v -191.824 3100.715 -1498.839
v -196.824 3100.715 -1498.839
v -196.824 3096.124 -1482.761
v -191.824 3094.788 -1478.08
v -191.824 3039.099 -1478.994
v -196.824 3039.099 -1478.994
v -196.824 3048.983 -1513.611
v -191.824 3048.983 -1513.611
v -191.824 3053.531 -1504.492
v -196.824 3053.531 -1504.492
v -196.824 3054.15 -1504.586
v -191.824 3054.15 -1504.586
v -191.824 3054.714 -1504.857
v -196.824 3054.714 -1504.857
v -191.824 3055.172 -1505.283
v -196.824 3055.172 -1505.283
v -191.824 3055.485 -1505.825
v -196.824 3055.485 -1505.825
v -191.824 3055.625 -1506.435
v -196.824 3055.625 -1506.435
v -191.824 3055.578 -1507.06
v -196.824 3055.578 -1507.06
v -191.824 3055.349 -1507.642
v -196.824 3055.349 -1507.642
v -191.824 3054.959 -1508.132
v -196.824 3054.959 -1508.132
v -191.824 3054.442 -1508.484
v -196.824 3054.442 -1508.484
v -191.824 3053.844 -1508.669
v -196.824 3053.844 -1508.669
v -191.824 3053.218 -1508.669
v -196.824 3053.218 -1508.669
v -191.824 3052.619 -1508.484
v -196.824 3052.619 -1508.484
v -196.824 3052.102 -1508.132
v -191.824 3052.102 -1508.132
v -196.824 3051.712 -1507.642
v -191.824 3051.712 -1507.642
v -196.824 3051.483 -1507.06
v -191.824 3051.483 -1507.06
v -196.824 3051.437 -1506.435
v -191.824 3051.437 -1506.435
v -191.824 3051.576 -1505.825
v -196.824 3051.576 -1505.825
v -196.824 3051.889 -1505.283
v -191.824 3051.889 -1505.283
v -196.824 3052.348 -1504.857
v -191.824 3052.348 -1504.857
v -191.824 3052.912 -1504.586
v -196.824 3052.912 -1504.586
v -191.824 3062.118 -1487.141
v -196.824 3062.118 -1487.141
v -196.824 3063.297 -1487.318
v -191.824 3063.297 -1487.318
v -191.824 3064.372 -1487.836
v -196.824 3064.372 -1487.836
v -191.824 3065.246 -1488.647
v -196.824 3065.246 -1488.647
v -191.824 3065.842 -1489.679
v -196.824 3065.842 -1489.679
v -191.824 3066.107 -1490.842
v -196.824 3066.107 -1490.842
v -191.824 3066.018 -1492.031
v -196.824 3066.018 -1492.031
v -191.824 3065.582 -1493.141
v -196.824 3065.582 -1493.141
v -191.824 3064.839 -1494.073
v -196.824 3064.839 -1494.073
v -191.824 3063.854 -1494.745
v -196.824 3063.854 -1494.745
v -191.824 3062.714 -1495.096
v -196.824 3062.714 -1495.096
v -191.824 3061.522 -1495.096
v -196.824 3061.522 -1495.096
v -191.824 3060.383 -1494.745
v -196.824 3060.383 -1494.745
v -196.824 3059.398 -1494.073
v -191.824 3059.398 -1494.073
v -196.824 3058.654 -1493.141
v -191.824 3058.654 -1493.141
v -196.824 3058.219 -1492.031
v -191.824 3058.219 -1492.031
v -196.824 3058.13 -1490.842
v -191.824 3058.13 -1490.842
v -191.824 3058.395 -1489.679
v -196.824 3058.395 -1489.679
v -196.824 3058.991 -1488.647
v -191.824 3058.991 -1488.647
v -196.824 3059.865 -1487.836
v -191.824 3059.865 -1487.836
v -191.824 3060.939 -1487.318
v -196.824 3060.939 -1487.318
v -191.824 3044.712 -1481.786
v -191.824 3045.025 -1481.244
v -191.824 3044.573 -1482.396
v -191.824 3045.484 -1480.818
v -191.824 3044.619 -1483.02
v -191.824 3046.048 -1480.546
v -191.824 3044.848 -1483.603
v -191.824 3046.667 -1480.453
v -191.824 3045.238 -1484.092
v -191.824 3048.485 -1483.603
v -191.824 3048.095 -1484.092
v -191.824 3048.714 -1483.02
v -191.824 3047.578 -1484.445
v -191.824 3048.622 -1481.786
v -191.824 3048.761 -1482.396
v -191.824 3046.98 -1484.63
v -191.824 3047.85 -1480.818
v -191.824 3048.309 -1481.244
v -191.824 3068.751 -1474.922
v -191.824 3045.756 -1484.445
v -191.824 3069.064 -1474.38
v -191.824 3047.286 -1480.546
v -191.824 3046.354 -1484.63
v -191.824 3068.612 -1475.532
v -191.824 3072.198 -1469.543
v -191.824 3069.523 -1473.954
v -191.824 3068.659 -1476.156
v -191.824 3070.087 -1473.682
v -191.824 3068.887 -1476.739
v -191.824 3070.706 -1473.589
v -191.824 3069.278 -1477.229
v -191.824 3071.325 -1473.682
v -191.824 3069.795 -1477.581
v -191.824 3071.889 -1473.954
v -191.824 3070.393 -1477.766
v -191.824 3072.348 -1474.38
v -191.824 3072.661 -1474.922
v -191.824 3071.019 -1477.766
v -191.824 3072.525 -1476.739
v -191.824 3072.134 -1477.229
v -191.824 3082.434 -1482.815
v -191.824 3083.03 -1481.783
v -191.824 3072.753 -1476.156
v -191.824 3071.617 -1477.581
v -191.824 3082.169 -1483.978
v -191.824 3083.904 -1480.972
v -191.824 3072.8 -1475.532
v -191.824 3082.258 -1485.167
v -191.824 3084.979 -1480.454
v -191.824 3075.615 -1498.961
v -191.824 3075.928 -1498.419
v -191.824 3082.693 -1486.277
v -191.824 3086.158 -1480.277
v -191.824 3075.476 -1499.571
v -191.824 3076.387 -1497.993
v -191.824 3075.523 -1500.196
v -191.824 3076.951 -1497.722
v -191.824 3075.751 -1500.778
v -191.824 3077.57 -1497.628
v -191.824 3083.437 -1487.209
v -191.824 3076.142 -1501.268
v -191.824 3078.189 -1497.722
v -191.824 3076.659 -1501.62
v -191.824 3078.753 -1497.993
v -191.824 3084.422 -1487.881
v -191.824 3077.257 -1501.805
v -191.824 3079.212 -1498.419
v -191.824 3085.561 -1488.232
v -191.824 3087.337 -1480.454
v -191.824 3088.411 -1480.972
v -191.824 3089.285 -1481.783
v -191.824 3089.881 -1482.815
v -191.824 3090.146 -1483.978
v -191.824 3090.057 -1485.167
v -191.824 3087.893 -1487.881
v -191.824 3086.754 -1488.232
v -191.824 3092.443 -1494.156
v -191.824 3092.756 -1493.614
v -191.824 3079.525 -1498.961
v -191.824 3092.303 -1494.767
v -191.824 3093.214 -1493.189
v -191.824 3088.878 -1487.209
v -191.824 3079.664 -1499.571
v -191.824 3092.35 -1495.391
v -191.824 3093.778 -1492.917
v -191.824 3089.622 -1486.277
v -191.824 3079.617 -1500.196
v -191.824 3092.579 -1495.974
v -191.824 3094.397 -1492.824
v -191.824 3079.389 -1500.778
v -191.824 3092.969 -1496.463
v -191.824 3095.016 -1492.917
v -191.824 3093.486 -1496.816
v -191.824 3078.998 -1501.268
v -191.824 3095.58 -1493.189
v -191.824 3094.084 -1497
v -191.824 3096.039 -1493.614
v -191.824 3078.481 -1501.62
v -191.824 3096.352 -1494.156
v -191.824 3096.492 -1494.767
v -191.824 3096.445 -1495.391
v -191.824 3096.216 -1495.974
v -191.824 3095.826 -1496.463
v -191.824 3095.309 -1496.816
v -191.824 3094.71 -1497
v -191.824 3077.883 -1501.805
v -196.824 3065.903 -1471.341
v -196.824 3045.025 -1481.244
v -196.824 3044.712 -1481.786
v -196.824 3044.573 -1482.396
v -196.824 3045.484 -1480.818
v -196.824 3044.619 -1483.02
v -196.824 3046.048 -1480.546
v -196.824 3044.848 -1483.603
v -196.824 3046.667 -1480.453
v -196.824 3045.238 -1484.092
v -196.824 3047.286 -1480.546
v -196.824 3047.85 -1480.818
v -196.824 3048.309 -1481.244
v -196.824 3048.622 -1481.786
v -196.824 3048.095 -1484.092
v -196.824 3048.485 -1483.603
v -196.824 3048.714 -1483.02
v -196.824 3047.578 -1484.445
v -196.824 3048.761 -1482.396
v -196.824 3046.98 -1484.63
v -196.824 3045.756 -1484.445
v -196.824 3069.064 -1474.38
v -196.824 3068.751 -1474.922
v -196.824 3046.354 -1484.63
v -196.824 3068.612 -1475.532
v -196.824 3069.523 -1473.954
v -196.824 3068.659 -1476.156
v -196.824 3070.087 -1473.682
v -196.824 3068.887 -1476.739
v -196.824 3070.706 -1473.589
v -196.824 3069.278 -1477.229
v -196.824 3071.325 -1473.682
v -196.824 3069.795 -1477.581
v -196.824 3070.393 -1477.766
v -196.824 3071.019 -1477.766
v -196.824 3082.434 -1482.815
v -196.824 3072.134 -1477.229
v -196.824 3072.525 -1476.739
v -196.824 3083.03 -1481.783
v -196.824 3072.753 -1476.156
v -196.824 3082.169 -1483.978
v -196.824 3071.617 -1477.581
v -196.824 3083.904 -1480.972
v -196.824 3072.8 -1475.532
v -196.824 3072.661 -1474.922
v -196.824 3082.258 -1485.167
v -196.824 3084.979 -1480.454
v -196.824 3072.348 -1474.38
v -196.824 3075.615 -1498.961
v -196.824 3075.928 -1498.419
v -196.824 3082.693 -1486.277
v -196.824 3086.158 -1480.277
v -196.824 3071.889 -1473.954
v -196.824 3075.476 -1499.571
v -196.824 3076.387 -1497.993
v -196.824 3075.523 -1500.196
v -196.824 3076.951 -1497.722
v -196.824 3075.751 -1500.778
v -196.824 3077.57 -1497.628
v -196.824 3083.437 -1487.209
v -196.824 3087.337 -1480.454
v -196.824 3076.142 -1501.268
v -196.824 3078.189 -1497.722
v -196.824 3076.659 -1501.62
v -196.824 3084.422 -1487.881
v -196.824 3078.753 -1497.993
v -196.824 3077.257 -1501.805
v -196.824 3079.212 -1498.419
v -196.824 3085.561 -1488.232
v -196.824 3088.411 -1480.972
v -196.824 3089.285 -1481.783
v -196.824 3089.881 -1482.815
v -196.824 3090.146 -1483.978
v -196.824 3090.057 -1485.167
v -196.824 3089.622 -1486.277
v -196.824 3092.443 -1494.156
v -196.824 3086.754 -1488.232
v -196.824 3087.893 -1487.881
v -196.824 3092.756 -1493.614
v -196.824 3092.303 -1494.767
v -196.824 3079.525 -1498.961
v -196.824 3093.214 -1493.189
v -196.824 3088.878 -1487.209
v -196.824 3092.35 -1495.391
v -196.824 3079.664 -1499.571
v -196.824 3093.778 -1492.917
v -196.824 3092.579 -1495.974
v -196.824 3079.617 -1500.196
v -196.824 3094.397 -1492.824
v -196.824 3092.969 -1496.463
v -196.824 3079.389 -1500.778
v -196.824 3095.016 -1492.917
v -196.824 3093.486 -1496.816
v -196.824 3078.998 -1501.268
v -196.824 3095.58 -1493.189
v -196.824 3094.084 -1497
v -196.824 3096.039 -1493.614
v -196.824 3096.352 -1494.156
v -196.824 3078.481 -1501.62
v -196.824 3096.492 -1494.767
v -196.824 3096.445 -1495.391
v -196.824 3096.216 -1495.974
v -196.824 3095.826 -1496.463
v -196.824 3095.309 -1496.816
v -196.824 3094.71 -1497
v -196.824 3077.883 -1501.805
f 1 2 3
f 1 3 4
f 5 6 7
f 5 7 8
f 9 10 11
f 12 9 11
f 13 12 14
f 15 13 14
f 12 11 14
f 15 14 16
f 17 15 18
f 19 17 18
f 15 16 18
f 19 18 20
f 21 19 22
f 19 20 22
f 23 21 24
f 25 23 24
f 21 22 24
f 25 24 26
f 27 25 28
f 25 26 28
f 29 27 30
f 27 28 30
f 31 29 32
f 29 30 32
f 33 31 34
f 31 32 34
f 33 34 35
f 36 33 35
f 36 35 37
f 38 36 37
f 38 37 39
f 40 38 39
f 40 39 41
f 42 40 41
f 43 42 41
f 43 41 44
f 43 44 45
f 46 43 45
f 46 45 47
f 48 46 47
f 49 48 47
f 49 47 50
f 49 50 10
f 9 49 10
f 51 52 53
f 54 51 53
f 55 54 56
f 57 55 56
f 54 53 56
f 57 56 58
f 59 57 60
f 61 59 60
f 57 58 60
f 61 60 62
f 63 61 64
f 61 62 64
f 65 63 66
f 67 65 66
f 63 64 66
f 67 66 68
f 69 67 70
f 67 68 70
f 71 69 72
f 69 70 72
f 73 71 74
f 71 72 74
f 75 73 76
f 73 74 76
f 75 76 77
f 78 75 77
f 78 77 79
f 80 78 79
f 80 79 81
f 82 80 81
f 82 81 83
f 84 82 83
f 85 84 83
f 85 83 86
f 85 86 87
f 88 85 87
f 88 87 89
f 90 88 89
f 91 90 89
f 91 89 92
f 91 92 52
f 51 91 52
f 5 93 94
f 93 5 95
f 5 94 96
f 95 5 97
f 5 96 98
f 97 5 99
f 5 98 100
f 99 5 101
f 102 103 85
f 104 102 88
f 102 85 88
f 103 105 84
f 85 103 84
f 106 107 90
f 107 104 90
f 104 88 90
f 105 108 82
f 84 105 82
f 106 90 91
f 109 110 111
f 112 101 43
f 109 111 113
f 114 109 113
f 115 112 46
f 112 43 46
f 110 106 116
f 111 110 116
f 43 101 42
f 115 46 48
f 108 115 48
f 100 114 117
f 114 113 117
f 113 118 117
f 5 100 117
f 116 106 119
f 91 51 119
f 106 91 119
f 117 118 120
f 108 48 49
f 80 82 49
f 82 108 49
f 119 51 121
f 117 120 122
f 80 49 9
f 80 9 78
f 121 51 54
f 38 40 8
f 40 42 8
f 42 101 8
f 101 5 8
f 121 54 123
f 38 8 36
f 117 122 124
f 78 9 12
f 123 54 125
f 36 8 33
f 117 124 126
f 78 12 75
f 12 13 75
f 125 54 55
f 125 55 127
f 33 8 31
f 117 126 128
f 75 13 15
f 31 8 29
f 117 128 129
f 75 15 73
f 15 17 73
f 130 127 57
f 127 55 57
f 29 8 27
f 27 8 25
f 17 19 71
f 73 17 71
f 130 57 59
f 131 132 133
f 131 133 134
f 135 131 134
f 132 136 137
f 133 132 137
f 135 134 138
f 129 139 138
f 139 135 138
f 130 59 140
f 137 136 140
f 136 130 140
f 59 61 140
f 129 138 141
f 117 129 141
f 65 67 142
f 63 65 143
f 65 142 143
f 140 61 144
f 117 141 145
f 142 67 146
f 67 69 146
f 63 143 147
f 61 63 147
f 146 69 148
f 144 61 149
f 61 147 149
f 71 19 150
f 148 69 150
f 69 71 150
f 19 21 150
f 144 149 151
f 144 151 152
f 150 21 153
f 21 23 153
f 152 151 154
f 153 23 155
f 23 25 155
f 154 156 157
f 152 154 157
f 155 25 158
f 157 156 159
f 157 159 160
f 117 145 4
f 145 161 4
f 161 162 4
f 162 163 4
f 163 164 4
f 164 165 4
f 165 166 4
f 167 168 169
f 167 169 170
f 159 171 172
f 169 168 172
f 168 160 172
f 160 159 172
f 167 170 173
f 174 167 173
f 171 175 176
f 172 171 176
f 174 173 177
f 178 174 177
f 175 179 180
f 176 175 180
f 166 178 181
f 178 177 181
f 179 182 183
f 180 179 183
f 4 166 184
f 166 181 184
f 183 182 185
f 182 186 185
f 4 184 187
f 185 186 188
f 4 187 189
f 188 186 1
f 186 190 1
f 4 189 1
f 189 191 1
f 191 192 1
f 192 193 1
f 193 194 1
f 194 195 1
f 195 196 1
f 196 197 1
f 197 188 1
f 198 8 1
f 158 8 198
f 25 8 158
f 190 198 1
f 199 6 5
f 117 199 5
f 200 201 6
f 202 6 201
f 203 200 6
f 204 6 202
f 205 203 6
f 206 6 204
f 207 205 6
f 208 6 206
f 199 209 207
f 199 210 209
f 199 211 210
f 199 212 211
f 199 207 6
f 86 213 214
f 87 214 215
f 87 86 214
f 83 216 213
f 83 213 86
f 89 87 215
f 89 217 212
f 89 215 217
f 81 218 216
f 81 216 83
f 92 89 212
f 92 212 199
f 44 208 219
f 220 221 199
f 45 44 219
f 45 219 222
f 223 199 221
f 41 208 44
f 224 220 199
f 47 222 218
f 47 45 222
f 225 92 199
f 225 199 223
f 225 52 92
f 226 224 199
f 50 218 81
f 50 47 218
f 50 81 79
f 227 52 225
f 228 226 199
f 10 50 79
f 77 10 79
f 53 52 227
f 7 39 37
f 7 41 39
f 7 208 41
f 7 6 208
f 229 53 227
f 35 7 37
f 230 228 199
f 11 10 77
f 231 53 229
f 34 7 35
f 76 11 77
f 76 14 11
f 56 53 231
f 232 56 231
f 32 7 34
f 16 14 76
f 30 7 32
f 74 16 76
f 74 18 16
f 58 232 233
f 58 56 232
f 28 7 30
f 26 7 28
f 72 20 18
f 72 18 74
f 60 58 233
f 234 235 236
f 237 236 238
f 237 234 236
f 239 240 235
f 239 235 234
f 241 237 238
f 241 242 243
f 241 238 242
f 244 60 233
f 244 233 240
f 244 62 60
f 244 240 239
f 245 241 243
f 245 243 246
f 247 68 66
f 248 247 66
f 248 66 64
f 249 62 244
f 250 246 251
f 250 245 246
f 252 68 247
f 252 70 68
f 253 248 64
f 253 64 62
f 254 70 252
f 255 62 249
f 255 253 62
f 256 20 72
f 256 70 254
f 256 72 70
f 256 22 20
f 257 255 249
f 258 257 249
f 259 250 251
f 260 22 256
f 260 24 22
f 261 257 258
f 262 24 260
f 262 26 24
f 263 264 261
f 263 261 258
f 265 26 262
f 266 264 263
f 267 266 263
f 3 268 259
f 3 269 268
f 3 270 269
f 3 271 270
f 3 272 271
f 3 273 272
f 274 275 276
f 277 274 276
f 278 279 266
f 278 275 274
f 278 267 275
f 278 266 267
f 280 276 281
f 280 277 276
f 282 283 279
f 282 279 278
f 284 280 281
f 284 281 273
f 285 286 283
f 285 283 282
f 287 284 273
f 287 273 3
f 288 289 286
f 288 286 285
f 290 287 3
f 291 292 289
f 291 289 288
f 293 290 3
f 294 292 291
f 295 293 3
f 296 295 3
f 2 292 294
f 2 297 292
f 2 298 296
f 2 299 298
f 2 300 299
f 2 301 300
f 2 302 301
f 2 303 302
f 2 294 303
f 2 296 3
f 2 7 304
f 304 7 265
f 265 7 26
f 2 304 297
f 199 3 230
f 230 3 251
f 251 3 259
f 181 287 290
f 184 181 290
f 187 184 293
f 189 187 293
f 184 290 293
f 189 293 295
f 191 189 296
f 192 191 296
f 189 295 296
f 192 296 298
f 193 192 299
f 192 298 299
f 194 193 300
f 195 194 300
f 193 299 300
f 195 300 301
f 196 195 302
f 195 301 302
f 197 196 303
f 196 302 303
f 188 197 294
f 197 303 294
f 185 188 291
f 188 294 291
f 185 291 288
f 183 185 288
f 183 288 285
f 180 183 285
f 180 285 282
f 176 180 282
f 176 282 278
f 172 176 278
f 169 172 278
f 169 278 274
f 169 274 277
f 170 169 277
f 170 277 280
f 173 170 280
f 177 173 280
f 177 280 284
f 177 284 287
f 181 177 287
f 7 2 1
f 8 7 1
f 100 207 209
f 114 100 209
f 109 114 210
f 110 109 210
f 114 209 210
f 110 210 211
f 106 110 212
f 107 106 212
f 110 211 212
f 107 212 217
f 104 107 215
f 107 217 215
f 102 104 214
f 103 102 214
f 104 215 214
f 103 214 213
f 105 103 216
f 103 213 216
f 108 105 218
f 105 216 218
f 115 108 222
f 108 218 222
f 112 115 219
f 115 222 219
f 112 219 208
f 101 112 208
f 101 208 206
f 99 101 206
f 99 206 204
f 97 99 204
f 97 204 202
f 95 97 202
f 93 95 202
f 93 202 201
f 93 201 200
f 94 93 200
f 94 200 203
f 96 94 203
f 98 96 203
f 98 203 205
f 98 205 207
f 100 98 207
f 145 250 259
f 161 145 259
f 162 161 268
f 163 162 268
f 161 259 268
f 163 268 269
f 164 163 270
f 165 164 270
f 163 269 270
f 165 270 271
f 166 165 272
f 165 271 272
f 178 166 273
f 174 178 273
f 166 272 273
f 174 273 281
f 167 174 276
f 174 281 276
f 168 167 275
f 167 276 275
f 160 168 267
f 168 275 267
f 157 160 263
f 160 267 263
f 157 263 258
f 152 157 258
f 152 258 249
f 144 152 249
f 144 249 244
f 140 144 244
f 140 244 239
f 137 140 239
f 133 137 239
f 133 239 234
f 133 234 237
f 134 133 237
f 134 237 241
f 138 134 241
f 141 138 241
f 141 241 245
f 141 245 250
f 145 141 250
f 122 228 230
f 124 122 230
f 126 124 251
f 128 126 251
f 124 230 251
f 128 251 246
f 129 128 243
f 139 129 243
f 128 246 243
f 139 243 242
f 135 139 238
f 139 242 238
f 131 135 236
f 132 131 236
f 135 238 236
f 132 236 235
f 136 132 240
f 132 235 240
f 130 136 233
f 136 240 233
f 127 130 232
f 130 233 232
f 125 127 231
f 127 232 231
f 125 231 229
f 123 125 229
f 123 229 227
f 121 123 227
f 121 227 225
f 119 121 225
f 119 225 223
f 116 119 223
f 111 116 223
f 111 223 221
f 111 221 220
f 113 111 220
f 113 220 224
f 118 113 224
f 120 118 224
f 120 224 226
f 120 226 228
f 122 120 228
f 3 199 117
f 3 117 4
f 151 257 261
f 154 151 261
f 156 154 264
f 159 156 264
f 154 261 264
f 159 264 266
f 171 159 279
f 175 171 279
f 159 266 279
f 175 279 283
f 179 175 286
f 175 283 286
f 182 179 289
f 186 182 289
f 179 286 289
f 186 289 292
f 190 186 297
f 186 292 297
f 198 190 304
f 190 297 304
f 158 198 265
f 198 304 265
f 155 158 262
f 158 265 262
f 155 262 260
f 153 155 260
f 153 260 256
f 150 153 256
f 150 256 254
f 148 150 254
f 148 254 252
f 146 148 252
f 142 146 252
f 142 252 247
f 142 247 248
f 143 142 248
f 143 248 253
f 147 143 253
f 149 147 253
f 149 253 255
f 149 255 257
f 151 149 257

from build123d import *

# Parameters (mm, degrees)
SKETCH2_W           = 5
SKETCH2_H           = 53.8
BOSS_EXTRUDE1_DEPTH = 36
CUT_EXTRUDE1_DEPTH  = 15.943798685
SKETCH4_R           = 2.1
SKETCH4_R_2         = 4
CUT_EXTRUDE2_DEPTH  = 6


with BuildPart() as part:
    # Sketch2 → Boss-Extrude1 (new body)
    with BuildSketch(Plane(origin=(0, 629.439859668, -2204.462438001), x_dir=(1, 0, 0), z_dir=(0, -0.274557173, 0.961570777))):
        with Locations((-194.323635178, 2543.140113693)):
            Rectangle(SKETCH2_W, SKETCH2_H)
    extrude(amount=BOSS_EXTRUDE1_DEPTH)

    # Sketch3 → Cut-Extrude1 (cut, through all)
    with BuildSketch(Plane(origin=(67.333864744, -30.465363781, -80.619122615), x_dir=(0.491076421, 0.867206701, 0.082440809), z_dir=(0.615661475, -0.278557467, -0.737134103))):
        Polygon((2395.145764251, -2402.321354937), (2500.725824186, -2486.45131954), (2658.658473348, -2288.251562261), (2553.078413412, -2204.121597658), align=None)
    extrude(amount=-CUT_EXTRUDE1_DEPTH, mode=Mode.SUBTRACT)

    # Sketch4 → Cut-Extrude2 (cut, through all)
    with BuildSketch(Plane.ZY.offset(196.823635178)):
        with Locations((-1506.592316509, 3053.530651846)):
            Circle(SKETCH4_R)
        with Locations((-1482.553047089, 3046.666722522)):
            Circle(SKETCH4_R)
        with Locations((-1499.728387186, 3077.569921266)):
            Circle(SKETCH4_R)
        with Locations((-1475.689117766, 3070.705991942)):
            Circle(SKETCH4_R)
        with Locations((-1470.88436724, 3087.533480536)):
            Circle(SKETCH4_R)
        with Locations((-1494.92363666, 3094.397409859)):
            Circle(SKETCH4_R)
        with Locations((-1484.276787814, 3086.157591314)):
            Circle(SKETCH4_R_2)
        with Locations((-1491.140717138, 3062.118321894)):
            Circle(SKETCH4_R_2)
    extrude(amount=-CUT_EXTRUDE2_DEPTH, mode=Mode.SUBTRACT)


solid = part.part
